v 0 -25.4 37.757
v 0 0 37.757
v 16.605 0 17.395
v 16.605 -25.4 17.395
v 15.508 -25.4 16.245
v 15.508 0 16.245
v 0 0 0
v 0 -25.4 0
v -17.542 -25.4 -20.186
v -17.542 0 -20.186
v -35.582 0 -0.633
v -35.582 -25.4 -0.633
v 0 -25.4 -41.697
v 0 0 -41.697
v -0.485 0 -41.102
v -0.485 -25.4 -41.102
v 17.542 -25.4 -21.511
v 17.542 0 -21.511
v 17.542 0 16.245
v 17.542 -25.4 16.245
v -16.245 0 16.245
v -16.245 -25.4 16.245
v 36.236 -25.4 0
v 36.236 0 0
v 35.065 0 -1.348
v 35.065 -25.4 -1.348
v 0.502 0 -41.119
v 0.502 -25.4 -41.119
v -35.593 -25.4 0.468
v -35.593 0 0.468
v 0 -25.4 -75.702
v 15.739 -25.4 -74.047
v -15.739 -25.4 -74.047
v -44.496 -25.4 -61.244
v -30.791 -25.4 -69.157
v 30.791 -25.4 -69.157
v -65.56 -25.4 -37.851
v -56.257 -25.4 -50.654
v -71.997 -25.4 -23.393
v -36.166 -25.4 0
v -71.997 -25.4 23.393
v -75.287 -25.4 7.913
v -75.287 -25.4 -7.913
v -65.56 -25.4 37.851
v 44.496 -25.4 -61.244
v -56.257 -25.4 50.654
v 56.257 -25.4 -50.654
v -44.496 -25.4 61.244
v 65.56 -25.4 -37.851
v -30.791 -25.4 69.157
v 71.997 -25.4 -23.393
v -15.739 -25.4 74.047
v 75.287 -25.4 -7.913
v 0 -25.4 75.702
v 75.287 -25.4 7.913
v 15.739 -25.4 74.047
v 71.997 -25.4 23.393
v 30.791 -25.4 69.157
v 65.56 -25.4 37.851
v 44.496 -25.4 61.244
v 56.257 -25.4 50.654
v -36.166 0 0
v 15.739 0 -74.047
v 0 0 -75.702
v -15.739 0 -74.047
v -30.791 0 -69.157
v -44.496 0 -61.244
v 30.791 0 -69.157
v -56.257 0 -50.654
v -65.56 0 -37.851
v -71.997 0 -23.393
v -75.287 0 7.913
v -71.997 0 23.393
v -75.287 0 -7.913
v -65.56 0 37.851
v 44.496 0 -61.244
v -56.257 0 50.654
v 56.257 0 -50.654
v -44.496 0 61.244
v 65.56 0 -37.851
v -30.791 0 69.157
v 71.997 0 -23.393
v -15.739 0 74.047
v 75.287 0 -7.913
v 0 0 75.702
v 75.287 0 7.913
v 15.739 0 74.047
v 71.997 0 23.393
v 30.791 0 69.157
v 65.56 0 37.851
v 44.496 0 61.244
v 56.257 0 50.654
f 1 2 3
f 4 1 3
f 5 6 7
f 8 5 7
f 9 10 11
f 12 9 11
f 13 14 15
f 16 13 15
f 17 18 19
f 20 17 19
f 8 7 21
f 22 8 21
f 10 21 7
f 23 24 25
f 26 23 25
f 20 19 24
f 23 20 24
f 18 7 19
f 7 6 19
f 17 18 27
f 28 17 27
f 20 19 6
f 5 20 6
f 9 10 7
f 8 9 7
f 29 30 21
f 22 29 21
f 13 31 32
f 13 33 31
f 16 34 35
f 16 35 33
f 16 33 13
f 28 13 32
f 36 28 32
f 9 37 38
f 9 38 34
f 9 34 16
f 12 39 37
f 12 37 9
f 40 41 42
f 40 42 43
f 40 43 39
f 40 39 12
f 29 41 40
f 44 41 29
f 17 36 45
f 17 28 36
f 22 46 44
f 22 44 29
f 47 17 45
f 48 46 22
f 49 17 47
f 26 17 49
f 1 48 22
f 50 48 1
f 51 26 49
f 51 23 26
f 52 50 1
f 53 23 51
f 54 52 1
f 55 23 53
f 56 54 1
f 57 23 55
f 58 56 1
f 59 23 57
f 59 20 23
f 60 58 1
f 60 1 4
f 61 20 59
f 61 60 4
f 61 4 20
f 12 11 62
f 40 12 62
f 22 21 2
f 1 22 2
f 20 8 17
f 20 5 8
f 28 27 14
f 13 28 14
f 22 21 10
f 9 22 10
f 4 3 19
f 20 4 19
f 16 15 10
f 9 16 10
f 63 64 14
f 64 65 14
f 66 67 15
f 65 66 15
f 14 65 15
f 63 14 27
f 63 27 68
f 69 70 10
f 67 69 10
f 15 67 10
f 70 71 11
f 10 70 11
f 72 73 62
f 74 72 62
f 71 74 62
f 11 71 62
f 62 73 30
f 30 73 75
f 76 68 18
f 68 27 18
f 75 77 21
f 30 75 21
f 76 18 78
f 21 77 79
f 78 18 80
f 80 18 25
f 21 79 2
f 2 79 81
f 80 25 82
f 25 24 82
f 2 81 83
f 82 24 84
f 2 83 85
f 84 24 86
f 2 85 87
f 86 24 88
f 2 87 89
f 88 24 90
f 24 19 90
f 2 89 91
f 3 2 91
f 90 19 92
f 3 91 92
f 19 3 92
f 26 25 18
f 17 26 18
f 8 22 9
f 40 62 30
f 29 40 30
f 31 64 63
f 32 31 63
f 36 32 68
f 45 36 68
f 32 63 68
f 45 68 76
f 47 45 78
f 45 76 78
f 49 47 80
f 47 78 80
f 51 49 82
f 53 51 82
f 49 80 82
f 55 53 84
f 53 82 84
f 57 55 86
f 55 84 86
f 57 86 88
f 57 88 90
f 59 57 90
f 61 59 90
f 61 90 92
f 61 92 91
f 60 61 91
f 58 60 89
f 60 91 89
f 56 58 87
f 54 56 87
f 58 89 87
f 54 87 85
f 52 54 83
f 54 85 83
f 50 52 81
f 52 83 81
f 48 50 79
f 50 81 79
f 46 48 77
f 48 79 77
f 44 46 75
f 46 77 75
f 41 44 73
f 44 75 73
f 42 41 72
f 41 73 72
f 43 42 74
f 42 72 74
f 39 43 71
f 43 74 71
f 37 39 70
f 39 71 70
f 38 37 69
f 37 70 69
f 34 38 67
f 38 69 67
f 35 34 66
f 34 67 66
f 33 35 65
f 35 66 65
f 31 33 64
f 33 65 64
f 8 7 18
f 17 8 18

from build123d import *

# Parameters (mm, degrees)
F1_DEPTH = 25.4


with BuildPart() as f1:
    # F0 (on Front) → F1 (new body)
    with BuildSketch(Plane.XZ):
        with BuildLine():
            Line((36.0940568046, 37.8100693834), (75.7017228123, 0))
            ThreePointArc((75.7017228123, 0), (0, 75.7017228123), (-75.7017228123, 0))
            Line((-75.7017228123, 0), (-1.7577517696, 73.9439710427))
            Line((-1.7577517696, 73.9439710427), (36.0940568046, 37.8100693834))
        make_face()
        Polygon((34.0044190793, -41.6973037331), (75.7017228123, 0), (36.0940568046, 37.8100693834), (35.1256847707, 0.9650623831), (36.2361905576, 0), (35.0648969253, -1.3478179023), align=None)
        with BuildLine():
            ThreePointArc((0, -75.7017228123), (53.5292015481, -53.5292015481), (75.7017228123, 0))
            Line((75.7017228123, 0), (34.0044190793, -41.6973037331))
            Line((34.0044190793, -41.6973037331), (0, -75.7017228123))
        make_face()
        with BuildLine():
            Line((-35.1984994172, -40.5032233952), (-75.7017228123, 0))
            ThreePointArc((-75.7017228123, 0), (-53.5292015481, -53.5292015481), (0, -75.7017228123))
            Line((0, -75.7017228123), (-35.1984994172, -40.5032233952))
        make_face()
        Polygon((-1.7577517696, 73.9439710427), (-75.7017228123, 0), (-35.1984994172, -40.5032233952), (-35.5822025801, -0.6328943901), (-36.1661069663, 0), (-35.5927929278, 0.4675412817), (-35.9341153342, 35.9341153342), (-37.8100693834, 37.8100693834), (36.0940568046, 37.8100693834), align=None)
        Polygon((-35.1984994172, -40.5032233952), (0, -75.7017228123), (34.0044190793, -41.6973037331), (0.5023601674, -41.1192334624), (0, -41.6973037331), (-0.4853180091, -41.1021913041), align=None)
        Polygon((35.1256847707, 0.9650623831), (36.0940568046, 37.8100693834), (16.6052143863, 17.3946727981), (17.5424247587, 16.2454355338), align=None)
        Polygon((16.6052143863, 17.3946727981), (36.0940568046, 37.8100693834), (-37.8100693834, 37.8100693834), (-35.9341153342, 35.9341153342), (-16.2454355338, 16.2454355338), (0, 37.7565165398), align=None)
        Polygon((0.5023601674, -41.1192334624), (34.0044190793, -41.6973037331), (17.5424247587, -21.511081006), align=None)
        Polygon((17.5424247587, -21.511081006), (34.0044190793, -41.6973037331), (35.0648969253, -1.3478179023), align=None)
        Polygon((-35.5822025801, -0.6328943901), (-35.1984994172, -40.5032233952), (-17.5424247587, -20.1862227271), align=None)
        Polygon((-17.5424247587, -20.1862227271), (-35.1984994172, -40.5032233952), (-0.4853180091, -41.1021913041), align=None)
        Polygon((-16.2454355338, 16.2454355338), (-35.9341153342, 35.9341153342), (-35.5927929278, 0.4675412817), align=None)
    extrude(amount=F1_DEPTH)


with BuildPart() as f1b:
    # F0 (on Front) → F1, piece 2 (new body)
    with BuildSketch(Plane.XZ):
        Polygon((0, 0), (17.5424247587, -21.511081006), (17.5424247587, 16.2454355338), (15.5081353336, 16.2454355338), align=None)
    extrude(amount=F1_DEPTH)


with BuildPart() as f1c:
    # F0 (on Front) → F1, piece 3 (new body)
    with BuildSketch(Plane.XZ):
        Polygon((-16.2454355338, 16.2454355338), (-17.5424247587, -20.1862227271), (0, 0), align=None)
    extrude(amount=F1_DEPTH)


solid = Compound([f1.part, f1b.part, f1c.part])
